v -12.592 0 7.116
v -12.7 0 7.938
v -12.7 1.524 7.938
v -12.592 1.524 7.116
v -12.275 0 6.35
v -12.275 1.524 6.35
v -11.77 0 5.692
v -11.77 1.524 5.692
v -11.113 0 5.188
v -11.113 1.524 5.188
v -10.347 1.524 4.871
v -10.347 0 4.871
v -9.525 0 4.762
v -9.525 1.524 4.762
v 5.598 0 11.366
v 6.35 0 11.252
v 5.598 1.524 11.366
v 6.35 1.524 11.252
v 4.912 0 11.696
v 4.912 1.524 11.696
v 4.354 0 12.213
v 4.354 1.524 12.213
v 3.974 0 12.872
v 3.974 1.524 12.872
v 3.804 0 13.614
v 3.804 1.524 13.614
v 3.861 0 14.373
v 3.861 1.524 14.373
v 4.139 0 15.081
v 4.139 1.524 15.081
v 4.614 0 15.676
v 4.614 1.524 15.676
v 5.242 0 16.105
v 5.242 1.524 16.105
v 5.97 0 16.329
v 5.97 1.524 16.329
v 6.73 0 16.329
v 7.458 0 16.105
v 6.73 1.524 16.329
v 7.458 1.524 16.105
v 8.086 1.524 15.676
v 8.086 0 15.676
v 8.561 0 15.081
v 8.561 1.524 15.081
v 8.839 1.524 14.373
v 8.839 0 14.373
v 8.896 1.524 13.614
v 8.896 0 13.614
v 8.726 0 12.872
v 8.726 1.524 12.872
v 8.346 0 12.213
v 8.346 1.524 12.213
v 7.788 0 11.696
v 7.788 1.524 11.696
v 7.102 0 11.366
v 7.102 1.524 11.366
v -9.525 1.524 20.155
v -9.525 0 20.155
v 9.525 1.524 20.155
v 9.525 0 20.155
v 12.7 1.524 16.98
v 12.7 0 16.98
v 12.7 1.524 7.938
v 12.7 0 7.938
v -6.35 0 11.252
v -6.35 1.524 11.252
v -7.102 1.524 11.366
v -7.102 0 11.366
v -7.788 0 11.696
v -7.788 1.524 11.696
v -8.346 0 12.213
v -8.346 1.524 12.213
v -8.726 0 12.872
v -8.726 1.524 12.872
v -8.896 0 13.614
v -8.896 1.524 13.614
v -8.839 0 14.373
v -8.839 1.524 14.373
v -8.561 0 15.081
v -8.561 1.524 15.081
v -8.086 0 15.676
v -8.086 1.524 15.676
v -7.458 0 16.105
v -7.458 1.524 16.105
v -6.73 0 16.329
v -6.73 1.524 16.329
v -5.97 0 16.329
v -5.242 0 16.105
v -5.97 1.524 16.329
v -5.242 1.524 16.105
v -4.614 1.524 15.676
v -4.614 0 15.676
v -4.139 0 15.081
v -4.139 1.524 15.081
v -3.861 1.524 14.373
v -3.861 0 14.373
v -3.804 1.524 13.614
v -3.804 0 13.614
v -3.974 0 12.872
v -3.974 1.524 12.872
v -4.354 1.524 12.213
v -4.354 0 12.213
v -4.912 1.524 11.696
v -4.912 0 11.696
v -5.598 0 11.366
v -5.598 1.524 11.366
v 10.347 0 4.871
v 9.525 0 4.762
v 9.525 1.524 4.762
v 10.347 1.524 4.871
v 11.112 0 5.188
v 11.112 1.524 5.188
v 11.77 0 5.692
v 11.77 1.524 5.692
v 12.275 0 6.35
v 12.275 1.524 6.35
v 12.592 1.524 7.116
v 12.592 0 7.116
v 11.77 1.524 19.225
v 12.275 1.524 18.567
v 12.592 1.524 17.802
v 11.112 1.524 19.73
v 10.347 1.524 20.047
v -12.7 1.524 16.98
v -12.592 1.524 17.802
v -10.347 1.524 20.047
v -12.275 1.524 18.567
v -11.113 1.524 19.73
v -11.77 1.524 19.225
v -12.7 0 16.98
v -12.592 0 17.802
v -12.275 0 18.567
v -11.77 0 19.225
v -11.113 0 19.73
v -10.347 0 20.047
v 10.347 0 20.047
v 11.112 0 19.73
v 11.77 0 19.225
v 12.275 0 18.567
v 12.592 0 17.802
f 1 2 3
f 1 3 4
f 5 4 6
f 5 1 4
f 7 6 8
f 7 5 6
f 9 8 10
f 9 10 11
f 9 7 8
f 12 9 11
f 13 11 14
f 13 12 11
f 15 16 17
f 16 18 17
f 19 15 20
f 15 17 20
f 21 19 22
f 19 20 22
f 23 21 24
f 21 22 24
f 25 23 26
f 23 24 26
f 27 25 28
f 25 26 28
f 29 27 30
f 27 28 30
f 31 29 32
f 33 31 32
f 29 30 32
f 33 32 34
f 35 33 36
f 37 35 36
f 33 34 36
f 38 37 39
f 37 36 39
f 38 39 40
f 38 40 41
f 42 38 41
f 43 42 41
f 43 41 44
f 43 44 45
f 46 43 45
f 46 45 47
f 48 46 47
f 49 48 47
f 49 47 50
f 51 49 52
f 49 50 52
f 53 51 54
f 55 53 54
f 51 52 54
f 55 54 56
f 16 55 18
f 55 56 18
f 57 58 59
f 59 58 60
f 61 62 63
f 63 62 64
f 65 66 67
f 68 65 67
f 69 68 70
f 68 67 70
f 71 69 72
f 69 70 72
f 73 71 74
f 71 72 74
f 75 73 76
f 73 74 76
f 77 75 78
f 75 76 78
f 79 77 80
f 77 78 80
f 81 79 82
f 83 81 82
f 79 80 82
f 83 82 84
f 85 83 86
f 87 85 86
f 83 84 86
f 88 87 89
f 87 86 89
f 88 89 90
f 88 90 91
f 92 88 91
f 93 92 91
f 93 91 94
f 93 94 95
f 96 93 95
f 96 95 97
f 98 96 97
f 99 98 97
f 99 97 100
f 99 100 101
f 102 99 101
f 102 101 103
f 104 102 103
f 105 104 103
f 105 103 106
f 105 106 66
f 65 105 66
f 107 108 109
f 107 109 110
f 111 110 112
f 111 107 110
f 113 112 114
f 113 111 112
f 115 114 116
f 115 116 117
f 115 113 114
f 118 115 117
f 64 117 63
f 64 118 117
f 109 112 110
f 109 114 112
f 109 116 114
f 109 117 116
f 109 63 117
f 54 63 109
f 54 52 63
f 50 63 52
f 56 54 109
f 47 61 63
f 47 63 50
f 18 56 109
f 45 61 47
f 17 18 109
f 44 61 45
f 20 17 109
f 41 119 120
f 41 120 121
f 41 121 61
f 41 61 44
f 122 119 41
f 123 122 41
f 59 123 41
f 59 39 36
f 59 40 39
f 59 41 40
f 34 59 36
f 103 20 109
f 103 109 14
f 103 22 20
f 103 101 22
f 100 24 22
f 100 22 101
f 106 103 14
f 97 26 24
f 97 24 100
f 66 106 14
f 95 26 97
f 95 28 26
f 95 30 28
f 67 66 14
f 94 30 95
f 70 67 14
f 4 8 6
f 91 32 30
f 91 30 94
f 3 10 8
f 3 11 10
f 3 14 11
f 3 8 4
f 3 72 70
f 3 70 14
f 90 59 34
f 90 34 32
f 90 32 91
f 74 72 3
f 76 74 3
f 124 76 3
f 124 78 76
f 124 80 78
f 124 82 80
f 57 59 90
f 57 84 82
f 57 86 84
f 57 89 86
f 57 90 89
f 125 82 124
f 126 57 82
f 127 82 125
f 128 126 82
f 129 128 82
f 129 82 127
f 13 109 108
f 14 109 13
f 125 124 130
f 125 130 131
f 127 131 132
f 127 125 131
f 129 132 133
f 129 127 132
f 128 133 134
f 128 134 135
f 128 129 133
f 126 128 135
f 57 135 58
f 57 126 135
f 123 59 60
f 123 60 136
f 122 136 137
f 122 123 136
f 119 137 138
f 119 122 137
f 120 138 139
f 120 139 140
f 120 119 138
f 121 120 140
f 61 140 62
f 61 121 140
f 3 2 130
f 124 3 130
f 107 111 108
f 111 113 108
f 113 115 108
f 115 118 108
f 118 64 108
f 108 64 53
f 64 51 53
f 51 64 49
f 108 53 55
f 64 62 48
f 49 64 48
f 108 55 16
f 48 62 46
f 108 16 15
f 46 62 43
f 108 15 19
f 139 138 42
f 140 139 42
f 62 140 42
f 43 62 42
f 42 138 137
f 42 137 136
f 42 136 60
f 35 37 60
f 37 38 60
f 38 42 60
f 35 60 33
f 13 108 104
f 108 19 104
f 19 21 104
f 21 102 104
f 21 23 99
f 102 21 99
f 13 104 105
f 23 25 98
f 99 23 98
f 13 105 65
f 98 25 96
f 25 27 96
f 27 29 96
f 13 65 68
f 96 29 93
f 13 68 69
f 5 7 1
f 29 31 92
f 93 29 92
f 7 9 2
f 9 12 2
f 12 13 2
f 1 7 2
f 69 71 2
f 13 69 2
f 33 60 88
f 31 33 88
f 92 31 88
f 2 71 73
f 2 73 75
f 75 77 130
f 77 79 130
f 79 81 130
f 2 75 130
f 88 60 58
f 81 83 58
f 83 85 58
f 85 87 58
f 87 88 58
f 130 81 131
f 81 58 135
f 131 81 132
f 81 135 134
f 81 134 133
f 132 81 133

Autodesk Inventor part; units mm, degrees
ref_plane "YZ Plane" through (0, 0, 0) normal (1, 0, 0) x (0, 1, 0)
ref_plane "XZ Plane" through (0, 0, 0) normal (0, 1, 0) x (-1, 0, 0)
ref_plane "XY Plane" through (0, 0, 0) normal (0, 0, 1) x (1, 0, 0)
sketch "Sketch1" plane through (0, 0, 0) normal (0, 1, 0) x (-1, 0, 0)
  line L0 (8.89, 0) -> (-8.89, 0) construction
  line L1 (8.89, 1.5875) -> (-8.89, 1.5875)
  line L2 (-8.89, -1.5875) -> (8.89, -1.5875)
  arc A0 (8.89, -1.5875) -> (8.89, 1.5875) centre (8.89, 0) ccw
  arc A1 (-8.89, 1.5875) -> (-8.89, -1.5875) centre (-8.89, 0) ccw
  line L3 (8.89, -5.0038) -> (-8.89, -5.0038) construction
  line L4 (8.89, -3.4163) -> (-8.89, -3.4163)
  line L5 (-8.89, -6.5913) -> (8.89, -6.5913)
  arc A2 (8.89, -6.5913) -> (8.89, -3.4163) centre (8.89, -5.0038) ccw
  arc A3 (-8.89, -3.4163) -> (-8.89, -6.5913) centre (-8.89, -5.0038) ccw
  line L6 (8.89, -10.0076) -> (-8.89, -10.0076) construction
  line L7 (8.89, -8.4201) -> (-8.89, -8.4201)
  line L8 (-8.89, -11.5951) -> (8.89, -11.5951)
  arc A4 (8.89, -11.5951) -> (8.89, -8.4201) centre (8.89, -10.0076) ccw
  arc A5 (-8.89, -8.4201) -> (-8.89, -11.5951) centre (-8.89, -10.0076) ccw
  line L9 (12.7, 20.1549) -> (-12.7, 20.1549)
  line L10 (-12.7, 20.1549) -> (-12.7, -17.9451)
  line L11 (-12.7, -17.9451) -> (12.7, -17.9451)
  line L12 (12.7, -17.9451) -> (12.7, 20.1549)
  line L13 (6.35, 13.8049) -> (-6.35, 13.8049) construction
  line L14 (-8.89, -16.5989) -> (8.89, -16.5989)
  arc A6 (8.89, -16.5989) -> (8.89, -13.4239) centre (8.89, -15.0114) ccw
  line L15 (8.89, -13.4239) -> (-8.89, -13.4239)
  line L16 (8.89, -15.0114) -> (-8.89, -15.0114) construction
  arc A7 (-8.89, -13.4239) -> (-8.89, -16.5989) centre (-8.89, -15.0114) ccw
  point P0 (0, 0)
  point P1 (0, -5.0038)
  point P2 (0, -10.0076)
  point P3 (10.4775, -5.0038)
  point P4 (10.4775, 0)
  point P5 (10.4775, -10.0076)
  point P6 (0, -17.9451)
  point P7 (0, -11.5951)
  point P8 (0, 13.8049)
  point P9 (0, 20.1549)
  point P10 (0, -16.5989)
  point P11 (10.4775, -15.0114)
  dimension "d1" = 17.78
  dimension "d3" = 3.175
  dimension "d4" = 5.0038
  dimension "d5" = 5.0038
  dimension "d8" = 25.4
  dimension "d9" = 38.1
  dimension "d10" = 6.35
  dimension "d11" = 12.7
  dimension "d12" = 6.35
  dimension "d25" = 5.0038
extrude "Extrusion1" add sketch "Sketch1" along normal blind 1.524
hole "Hole1" at (-6.35, 0, 13.8049) at (6.35, 0, 13.8049) direction (0, 1, 0) diameter 5.1054 end through all clearance for "Flat Head Machine Screw (82)" size "#10" standard "Ansi Unified Screw Threads"
fillet "Fillet1" radius 3.175 4 edges at (-12.7, 0.762, -17.9451) (12.7, 0.762, -17.9451) (12.7, 0.762, 20.1549) (-12.7, 0.762, 20.1549)
sketch "Sketch2" plane through (0, 1.524, 0) normal (0, 1, 0) x (1, 0, 0)
  line L0 (-12.7, 20.6375) -> (12.7, 20.6375)
  line L1 (12.7, 20.6375) -> (12.7, -4.7625)
  line L2 (12.7, -4.7625) -> (-12.7, -4.7625)
  line L3 (-12.7, -4.7625) -> (-12.7, 20.6375)
  line L4 (9.525, 17.9451) -> (-9.525, 17.9451) construction
  line L5 (8.89, -1.5875) -> (-8.89, -1.5875) construction
  point P0 (0, 0)
  point P1 (0, 20.6375)
  point P2 (0, 17.9451)
  dimension "d30" = 25.4
  dimension "d31" = 25.4
  dimension "d32" = 3.175
extrude "Extrusion2" cut sketch "Sketch2" against normal through all
fillet "Fillet2" radius 3.175 2 edges at (12.7, 0.762, 4.7625) (-12.7, 0.762, 4.7625)
equation "\"d5\" = d4"
properties part number "EL2-033" material "ABS Plastic"
